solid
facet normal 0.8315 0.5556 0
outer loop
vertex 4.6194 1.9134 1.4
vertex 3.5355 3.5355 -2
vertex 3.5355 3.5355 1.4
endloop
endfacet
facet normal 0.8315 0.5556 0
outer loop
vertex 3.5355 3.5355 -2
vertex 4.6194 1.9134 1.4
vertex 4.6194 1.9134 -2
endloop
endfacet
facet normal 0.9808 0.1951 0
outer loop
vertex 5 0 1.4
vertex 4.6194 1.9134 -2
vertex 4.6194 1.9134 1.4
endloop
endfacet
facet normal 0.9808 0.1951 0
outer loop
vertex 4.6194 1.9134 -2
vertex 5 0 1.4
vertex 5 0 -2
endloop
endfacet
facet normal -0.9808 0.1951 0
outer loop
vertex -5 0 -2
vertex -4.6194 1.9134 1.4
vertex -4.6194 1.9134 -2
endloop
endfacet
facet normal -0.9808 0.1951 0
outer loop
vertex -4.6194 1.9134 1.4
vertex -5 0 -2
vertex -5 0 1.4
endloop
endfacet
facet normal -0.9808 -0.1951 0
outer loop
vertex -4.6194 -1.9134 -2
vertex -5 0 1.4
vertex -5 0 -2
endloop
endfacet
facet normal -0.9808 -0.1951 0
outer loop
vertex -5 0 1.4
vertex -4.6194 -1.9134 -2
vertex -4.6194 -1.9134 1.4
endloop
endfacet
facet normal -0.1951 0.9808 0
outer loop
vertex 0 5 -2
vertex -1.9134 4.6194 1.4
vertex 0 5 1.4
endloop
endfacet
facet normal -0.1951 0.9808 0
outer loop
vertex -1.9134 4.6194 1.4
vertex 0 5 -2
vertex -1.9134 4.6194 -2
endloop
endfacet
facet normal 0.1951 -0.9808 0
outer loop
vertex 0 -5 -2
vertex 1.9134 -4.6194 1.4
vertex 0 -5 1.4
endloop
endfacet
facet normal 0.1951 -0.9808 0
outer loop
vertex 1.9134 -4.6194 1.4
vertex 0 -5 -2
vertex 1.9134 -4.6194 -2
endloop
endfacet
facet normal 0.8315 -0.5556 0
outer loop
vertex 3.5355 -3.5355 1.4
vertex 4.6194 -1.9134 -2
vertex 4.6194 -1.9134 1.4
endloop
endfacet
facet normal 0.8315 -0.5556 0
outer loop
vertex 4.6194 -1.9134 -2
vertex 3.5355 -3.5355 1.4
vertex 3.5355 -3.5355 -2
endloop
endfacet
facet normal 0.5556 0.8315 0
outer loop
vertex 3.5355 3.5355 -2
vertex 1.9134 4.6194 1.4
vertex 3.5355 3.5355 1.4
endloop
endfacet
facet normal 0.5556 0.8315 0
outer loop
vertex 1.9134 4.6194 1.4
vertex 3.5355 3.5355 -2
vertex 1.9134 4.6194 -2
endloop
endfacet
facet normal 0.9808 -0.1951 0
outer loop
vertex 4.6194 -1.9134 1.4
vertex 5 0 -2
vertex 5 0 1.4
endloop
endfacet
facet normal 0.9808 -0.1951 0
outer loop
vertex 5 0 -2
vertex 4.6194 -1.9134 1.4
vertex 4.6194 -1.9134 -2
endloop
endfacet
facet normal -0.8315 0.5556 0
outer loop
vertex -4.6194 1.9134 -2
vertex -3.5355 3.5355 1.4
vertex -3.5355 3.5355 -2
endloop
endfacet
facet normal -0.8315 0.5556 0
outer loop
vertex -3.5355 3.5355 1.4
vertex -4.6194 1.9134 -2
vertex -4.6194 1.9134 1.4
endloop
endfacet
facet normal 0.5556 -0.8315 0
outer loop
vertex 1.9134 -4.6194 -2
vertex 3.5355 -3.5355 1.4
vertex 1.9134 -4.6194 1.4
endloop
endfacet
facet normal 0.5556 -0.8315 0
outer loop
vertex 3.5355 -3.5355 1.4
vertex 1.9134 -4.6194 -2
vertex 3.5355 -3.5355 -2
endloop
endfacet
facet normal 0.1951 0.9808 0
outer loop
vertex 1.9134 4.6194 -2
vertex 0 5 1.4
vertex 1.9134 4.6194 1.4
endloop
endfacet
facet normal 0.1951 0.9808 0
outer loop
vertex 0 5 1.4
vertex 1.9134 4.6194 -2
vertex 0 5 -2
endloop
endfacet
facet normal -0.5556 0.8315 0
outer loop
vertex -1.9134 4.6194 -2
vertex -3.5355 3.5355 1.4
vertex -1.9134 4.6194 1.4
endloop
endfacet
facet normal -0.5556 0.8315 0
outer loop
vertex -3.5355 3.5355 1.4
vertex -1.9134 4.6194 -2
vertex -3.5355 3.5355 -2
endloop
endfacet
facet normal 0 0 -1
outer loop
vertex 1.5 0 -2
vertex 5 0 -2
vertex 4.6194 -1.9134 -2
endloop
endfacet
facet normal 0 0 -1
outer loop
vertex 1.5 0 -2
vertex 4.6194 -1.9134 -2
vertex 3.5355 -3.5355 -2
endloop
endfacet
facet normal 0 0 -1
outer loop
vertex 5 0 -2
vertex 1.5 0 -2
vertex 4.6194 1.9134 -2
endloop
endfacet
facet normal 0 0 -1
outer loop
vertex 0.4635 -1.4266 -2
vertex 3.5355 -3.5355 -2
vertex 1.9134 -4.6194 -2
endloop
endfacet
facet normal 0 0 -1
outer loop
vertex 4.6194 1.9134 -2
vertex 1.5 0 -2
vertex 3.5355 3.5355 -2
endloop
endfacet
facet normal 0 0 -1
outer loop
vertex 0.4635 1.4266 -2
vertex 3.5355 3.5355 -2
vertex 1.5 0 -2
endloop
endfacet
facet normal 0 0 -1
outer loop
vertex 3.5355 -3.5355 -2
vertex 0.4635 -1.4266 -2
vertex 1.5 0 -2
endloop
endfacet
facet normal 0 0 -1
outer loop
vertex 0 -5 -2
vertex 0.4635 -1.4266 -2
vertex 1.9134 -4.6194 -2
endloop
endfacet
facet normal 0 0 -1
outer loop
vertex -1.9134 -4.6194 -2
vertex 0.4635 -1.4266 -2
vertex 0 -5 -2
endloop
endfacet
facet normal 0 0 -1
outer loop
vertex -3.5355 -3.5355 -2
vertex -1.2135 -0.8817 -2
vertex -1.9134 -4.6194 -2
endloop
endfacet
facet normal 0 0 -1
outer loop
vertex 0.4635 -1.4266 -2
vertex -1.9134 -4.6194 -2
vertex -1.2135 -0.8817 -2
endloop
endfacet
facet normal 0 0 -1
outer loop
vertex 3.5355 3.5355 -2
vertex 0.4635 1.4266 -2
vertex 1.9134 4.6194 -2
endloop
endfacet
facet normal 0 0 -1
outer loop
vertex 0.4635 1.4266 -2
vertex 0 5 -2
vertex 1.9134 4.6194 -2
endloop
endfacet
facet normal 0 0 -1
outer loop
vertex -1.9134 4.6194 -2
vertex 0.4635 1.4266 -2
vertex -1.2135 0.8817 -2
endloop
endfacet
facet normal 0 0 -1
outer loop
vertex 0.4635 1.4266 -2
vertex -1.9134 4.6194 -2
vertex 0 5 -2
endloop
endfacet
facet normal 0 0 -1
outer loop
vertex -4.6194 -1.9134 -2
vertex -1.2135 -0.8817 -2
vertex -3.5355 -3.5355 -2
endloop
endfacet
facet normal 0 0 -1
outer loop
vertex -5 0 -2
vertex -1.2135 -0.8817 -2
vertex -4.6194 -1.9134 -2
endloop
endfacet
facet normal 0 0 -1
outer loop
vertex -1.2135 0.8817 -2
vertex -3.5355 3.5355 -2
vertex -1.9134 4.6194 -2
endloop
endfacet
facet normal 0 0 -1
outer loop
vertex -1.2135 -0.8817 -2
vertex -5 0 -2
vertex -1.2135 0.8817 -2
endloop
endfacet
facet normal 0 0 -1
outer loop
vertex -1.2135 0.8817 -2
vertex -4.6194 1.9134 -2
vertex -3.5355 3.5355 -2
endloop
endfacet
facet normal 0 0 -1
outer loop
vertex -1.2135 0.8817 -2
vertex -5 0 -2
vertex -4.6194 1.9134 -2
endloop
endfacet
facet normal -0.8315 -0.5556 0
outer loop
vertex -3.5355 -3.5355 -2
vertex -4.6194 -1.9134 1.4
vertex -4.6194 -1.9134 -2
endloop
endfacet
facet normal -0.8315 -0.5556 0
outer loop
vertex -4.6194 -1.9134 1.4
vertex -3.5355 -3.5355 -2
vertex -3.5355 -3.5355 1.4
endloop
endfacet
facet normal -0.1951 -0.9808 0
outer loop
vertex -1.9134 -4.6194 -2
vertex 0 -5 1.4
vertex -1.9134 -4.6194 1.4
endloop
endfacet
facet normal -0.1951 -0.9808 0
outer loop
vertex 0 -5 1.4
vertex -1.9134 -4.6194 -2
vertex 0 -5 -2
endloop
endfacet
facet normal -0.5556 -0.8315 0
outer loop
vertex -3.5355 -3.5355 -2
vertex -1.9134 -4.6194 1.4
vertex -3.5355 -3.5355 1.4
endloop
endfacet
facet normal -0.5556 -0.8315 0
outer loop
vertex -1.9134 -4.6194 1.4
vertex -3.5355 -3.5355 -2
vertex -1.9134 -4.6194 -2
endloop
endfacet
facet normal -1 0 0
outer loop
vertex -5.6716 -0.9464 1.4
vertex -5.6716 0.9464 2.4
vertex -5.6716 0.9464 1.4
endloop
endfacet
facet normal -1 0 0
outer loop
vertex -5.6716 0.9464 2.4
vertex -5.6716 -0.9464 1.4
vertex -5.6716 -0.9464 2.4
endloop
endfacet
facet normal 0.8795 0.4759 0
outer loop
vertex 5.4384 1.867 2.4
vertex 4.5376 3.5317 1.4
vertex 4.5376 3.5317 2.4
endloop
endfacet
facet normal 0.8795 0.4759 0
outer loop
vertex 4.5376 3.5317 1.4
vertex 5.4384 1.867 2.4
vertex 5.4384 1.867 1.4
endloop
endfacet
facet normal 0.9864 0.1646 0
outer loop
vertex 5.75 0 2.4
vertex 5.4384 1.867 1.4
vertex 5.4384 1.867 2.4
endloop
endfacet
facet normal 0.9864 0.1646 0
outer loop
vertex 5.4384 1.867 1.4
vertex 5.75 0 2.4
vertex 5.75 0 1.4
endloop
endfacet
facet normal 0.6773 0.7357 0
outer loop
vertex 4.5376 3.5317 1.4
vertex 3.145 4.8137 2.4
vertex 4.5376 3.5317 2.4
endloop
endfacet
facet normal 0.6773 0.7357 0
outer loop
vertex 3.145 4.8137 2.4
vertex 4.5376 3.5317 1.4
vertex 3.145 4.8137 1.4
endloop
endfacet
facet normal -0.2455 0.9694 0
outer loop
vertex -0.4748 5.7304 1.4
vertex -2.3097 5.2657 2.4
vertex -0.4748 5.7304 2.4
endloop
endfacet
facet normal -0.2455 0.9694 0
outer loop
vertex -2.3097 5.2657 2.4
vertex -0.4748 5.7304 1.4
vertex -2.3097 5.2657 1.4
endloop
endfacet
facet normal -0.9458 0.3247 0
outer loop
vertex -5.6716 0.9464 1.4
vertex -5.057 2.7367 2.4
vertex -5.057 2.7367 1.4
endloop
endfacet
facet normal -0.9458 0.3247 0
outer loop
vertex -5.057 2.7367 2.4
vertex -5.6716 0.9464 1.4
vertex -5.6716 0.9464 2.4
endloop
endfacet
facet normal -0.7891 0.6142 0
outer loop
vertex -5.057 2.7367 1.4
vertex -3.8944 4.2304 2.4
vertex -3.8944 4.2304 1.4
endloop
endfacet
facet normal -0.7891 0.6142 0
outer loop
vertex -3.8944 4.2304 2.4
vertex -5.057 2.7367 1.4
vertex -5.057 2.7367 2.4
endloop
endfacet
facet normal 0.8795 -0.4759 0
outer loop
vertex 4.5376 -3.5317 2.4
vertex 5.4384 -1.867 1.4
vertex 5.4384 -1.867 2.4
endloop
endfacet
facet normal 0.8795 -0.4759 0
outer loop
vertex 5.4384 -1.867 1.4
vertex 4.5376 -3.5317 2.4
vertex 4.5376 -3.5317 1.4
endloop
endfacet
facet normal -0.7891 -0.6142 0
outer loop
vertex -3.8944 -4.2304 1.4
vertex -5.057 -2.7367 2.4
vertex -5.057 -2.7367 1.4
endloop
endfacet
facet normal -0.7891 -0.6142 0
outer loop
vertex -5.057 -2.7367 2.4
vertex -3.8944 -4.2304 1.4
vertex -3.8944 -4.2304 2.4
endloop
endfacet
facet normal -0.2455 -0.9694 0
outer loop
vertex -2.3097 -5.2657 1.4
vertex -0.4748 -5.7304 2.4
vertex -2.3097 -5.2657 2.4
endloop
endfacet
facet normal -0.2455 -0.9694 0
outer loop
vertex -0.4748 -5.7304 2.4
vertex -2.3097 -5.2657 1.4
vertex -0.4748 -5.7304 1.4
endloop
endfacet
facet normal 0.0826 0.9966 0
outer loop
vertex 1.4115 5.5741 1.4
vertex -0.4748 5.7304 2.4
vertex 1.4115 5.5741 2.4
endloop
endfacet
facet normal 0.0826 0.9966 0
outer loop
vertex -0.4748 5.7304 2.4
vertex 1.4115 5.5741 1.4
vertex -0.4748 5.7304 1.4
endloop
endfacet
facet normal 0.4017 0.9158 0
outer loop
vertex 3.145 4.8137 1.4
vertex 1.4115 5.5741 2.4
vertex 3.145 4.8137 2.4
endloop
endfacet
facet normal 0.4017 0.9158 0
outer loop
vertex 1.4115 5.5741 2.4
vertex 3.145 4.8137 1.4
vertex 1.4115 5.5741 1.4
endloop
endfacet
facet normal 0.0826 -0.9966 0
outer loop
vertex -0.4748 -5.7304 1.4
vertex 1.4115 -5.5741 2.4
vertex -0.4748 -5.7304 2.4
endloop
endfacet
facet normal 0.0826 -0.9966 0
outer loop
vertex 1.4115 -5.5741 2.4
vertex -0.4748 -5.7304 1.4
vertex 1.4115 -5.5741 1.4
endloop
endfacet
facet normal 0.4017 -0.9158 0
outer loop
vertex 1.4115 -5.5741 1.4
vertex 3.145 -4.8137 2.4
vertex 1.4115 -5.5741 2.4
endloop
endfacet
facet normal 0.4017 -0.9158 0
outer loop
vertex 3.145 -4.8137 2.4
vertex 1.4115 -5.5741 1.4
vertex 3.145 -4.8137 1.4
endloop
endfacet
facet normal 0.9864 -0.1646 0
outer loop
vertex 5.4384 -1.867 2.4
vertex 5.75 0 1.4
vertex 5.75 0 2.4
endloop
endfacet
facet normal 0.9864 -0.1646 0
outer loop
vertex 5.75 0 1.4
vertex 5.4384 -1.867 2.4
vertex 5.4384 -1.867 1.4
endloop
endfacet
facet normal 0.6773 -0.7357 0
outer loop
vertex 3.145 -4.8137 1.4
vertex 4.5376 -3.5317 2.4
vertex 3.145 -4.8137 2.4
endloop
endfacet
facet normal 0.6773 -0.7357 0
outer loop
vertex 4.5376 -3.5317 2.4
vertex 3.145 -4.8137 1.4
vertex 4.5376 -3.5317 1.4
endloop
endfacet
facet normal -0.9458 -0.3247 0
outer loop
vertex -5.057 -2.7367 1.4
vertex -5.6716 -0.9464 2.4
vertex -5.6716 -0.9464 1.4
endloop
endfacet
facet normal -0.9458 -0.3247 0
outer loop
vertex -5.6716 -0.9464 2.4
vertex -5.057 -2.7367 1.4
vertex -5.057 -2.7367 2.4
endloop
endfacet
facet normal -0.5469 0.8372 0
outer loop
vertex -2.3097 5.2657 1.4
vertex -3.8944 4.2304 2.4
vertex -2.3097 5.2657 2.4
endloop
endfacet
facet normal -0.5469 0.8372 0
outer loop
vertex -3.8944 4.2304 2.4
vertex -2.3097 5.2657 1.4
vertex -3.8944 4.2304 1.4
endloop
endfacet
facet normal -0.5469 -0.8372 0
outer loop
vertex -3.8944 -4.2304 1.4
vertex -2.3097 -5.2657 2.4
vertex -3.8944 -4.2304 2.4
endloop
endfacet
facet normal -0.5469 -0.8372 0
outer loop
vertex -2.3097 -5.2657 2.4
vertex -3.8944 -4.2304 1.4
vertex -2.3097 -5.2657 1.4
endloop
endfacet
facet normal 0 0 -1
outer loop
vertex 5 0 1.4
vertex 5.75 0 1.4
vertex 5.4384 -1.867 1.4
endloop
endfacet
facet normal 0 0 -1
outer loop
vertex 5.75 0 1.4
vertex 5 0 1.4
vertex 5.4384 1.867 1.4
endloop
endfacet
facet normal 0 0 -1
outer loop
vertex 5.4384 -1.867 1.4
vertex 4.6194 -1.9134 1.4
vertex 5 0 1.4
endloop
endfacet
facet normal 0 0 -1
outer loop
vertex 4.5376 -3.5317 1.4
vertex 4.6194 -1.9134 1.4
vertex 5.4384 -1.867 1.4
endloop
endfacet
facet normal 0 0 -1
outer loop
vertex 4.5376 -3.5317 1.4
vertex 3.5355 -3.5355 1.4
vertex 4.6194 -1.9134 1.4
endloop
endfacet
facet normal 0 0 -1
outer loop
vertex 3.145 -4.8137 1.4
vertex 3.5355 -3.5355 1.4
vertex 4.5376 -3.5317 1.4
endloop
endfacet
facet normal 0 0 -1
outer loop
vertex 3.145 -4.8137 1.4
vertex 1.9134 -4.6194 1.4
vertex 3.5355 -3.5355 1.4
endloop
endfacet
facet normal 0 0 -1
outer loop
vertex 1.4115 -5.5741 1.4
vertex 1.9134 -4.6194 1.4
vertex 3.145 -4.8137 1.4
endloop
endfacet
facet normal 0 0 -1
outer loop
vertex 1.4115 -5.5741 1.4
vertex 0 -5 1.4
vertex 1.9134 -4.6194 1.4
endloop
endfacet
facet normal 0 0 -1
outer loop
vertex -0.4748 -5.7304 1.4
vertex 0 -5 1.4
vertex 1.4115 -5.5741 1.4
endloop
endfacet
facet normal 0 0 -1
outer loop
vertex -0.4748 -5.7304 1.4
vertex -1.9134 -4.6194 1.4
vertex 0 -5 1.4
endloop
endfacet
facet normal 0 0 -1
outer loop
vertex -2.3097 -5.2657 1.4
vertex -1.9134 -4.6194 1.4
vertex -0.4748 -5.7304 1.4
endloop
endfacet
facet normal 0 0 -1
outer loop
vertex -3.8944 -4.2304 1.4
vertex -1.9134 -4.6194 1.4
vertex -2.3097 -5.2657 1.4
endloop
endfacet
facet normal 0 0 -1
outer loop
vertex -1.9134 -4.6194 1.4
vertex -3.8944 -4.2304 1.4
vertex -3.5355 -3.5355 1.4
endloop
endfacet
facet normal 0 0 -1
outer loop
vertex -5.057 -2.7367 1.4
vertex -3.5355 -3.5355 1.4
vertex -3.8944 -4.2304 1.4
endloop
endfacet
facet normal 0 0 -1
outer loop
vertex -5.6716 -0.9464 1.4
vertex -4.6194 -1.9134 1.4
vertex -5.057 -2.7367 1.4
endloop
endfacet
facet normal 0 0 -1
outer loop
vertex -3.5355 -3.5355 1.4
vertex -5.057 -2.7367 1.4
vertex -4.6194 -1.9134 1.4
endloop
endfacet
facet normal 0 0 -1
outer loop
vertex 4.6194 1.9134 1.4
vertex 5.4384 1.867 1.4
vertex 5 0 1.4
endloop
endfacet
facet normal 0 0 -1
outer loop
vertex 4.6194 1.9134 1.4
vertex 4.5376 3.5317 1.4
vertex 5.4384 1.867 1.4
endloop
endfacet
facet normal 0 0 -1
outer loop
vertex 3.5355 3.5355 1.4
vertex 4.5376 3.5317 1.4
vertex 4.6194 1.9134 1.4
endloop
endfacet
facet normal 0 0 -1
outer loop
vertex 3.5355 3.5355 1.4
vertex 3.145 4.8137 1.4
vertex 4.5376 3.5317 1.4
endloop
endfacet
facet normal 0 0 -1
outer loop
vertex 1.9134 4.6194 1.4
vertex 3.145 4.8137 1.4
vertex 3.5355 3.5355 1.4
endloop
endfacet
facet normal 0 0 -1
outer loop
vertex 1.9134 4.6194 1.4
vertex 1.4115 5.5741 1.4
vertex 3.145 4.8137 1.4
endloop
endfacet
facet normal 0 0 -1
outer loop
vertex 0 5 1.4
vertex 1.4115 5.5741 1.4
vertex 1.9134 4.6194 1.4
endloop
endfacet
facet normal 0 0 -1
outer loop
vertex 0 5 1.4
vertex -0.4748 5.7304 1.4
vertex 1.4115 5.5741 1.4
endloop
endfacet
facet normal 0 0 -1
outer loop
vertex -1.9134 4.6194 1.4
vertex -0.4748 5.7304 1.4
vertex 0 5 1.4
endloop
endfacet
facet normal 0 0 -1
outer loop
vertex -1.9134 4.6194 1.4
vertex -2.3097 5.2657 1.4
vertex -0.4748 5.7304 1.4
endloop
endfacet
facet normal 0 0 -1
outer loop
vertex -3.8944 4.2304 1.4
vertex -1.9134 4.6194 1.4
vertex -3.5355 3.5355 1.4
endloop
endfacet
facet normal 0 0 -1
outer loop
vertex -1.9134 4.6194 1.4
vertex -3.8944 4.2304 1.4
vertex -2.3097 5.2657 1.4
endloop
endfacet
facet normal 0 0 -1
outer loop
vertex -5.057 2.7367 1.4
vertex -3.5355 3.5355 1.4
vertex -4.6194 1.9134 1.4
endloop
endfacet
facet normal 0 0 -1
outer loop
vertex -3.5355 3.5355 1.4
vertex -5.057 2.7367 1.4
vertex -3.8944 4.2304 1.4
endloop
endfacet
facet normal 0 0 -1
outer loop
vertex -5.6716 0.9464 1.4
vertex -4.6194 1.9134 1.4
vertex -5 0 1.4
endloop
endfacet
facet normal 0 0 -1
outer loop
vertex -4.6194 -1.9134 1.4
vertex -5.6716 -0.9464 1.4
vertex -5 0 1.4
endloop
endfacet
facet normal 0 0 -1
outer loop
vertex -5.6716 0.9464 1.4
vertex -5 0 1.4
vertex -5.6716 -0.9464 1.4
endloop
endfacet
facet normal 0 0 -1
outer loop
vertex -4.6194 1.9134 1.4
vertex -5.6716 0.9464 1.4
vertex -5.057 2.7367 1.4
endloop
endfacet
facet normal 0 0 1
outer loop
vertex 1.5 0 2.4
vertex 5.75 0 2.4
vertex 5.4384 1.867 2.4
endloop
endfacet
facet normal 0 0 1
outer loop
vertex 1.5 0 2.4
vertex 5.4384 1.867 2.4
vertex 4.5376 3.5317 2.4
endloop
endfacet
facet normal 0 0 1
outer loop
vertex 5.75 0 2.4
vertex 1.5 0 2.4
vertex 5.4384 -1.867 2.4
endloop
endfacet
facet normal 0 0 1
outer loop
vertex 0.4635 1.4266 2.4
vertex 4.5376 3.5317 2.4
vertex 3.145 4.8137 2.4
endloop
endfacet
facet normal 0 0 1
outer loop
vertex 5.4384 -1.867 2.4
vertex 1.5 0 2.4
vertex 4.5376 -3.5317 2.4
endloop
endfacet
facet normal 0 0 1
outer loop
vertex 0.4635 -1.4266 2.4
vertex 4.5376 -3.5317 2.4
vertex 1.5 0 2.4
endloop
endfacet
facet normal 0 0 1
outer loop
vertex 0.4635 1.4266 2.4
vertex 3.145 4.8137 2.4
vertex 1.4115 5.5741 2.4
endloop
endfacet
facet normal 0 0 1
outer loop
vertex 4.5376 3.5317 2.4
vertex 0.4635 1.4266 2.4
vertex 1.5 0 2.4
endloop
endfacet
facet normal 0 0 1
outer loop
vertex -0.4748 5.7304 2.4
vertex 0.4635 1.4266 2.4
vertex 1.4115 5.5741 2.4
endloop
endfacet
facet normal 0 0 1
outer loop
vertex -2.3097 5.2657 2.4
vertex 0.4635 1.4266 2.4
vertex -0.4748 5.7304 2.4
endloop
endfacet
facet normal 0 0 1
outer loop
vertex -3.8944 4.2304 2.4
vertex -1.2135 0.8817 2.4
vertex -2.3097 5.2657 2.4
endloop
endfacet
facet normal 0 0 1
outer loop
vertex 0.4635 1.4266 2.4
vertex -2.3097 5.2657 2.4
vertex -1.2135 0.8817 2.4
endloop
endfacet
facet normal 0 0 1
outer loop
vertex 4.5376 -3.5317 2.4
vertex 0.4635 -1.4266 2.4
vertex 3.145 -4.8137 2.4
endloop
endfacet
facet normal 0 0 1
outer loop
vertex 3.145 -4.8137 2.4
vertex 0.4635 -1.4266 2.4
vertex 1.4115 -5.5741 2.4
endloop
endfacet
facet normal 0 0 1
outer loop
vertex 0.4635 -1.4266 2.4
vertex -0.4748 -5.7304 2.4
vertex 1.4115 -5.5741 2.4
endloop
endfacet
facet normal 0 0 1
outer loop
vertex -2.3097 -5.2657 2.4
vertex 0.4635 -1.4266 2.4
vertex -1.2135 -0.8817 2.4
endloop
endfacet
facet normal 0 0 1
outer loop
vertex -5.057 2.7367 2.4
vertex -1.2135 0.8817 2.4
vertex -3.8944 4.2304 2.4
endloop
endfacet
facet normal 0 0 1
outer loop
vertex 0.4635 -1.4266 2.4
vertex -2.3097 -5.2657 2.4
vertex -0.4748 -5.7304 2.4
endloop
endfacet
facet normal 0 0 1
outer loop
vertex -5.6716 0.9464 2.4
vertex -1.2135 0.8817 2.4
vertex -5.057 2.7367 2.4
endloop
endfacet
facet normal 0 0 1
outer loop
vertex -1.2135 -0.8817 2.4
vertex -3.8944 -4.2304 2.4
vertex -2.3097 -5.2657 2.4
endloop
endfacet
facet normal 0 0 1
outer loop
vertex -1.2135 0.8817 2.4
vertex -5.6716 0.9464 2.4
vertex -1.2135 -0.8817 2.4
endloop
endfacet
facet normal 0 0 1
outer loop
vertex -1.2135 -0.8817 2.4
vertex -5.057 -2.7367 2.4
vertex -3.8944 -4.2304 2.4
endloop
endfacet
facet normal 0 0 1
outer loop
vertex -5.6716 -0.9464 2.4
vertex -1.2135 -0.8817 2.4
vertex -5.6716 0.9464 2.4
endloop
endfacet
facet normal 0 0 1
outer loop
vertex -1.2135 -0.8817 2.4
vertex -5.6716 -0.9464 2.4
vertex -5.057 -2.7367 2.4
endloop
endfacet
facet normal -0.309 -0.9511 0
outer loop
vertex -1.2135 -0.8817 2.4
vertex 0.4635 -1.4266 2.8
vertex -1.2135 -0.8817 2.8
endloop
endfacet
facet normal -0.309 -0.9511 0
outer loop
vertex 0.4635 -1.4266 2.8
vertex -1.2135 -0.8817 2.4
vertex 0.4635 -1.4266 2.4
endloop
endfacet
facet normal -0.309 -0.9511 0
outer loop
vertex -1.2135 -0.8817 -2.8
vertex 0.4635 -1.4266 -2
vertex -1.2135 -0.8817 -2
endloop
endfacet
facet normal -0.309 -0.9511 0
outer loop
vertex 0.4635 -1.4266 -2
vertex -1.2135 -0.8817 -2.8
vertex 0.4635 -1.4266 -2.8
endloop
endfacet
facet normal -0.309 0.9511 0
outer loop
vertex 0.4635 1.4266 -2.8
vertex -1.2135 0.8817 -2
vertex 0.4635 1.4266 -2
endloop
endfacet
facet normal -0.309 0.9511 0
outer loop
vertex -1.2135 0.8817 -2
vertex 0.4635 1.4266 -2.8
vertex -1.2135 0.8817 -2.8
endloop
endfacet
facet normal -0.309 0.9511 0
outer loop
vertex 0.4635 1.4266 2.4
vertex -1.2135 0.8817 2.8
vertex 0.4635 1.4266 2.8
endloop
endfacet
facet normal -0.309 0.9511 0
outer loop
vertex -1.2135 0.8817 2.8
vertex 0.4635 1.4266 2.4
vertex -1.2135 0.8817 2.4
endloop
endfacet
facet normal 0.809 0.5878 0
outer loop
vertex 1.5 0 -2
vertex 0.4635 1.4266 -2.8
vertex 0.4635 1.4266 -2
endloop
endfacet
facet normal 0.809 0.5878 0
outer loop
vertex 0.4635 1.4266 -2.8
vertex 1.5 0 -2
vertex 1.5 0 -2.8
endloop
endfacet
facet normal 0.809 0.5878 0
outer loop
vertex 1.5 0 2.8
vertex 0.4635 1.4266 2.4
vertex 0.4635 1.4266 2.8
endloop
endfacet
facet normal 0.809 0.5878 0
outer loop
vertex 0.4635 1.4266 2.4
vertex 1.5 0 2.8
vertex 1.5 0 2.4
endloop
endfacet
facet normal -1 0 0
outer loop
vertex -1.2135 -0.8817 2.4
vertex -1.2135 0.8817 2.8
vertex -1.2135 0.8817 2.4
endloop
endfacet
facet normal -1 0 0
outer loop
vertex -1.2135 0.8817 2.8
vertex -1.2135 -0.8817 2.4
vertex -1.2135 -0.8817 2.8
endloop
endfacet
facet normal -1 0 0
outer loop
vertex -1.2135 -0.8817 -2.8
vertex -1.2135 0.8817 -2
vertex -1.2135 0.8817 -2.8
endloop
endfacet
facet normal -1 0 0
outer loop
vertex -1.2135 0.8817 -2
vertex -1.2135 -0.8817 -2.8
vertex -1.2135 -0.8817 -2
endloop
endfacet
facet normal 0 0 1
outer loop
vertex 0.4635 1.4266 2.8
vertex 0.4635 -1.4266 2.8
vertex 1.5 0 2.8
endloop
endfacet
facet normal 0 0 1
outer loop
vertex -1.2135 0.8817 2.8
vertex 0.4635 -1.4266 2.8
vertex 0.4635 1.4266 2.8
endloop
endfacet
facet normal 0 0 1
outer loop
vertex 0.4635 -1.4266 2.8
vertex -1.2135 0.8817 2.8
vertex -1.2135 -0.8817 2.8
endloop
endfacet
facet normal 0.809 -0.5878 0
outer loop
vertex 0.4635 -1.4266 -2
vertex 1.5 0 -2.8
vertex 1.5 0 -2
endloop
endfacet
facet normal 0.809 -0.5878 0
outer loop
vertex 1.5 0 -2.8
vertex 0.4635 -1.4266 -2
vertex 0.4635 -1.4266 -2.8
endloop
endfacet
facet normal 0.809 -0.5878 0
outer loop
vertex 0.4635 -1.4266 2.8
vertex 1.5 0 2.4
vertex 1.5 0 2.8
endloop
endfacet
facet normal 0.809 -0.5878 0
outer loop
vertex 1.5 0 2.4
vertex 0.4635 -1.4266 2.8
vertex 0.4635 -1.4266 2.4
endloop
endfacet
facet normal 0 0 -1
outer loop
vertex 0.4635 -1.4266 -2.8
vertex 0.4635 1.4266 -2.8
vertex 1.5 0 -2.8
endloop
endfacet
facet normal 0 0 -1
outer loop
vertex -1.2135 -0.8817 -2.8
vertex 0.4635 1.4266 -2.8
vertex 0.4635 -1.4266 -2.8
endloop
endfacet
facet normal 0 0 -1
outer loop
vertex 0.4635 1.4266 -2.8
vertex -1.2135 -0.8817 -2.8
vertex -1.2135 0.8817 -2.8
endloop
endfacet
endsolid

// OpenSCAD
// Parameters
bore_diameter_mm = 3.0; //[1.5:6.0:0.1]
outer_diameter_mm = 10.0; //[5.0:20.0:0.1]
width_mm = 4.0; //[2.0:8.0:0.1]
flange_outer_diameter_mm = 11.5; //[6.0:23.0:0.1]
flange_width_mm = 1.0; //[0.5:2.0:0.1]
outer_race_radial_thickness_mm = 1.2; //[0.6:2.4:0.1]
inner_race_radial_thickness_mm = 1.0; //[0.5:2.0:0.1]
shield_band_radial_thickness_mm = 0.4; //[0.2:1.0:0.05]
shield_band_axial_clearance_mm = 0.6; //[0.3:1.2:0.05]
ball_diameter_mm = 1.2; //[0.6:2.4:0.1]
ball_center_radius_mm = 3.25; //[2.0:5.0:0.05]
connection_overlap_mm = 0.8; //[0.5:2.0:0.1]

// Ball Bearing - complete geometry
module ball_bearing() {
  color("DimGray") {
    // Outer Race
    cylinder(r=outer_diameter_mm/2, h=width_mm, center=true);
    
    // Inner Race
    translate([0, 0, 0])
      cylinder(r=bore_diameter_mm/2 + inner_race_radial_thickness_mm, h=width_mm, center=true);
    
    // Flange
    translate([0, 0, width_mm/2 - flange_width_mm/2 + connection_overlap_mm/2])
      cylinder(r=flange_outer_diameter_mm/2, h=flange_width_mm, center=true);
    
    // Shield or Seal Band
    translate([0, 0, 0])
      cylinder(r=outer_diameter_mm/2 - outer_race_radial_thickness_mm + shield_band_radial_thickness_mm, h=width_mm - shield_band_axial_clearance_mm, center=true);
  }
  
  // Bore Through Hole
  translate([0, 0, 0])
    color("Black")
    cylinder(r=bore_diameter_mm/2, h=width_mm + 2*connection_overlap_mm, center=true);
}

// Bearing Ball - complete geometry
module bearing_ball() {
  color("Silver") {
    translate([ball_center_radius_mm, 0, 0])
      sphere(r=ball_diameter_mm/2, center=true);
  }
}

// Assembly
module assembly() {
  ball_bearing();
  bearing_ball();
}

assembly();
